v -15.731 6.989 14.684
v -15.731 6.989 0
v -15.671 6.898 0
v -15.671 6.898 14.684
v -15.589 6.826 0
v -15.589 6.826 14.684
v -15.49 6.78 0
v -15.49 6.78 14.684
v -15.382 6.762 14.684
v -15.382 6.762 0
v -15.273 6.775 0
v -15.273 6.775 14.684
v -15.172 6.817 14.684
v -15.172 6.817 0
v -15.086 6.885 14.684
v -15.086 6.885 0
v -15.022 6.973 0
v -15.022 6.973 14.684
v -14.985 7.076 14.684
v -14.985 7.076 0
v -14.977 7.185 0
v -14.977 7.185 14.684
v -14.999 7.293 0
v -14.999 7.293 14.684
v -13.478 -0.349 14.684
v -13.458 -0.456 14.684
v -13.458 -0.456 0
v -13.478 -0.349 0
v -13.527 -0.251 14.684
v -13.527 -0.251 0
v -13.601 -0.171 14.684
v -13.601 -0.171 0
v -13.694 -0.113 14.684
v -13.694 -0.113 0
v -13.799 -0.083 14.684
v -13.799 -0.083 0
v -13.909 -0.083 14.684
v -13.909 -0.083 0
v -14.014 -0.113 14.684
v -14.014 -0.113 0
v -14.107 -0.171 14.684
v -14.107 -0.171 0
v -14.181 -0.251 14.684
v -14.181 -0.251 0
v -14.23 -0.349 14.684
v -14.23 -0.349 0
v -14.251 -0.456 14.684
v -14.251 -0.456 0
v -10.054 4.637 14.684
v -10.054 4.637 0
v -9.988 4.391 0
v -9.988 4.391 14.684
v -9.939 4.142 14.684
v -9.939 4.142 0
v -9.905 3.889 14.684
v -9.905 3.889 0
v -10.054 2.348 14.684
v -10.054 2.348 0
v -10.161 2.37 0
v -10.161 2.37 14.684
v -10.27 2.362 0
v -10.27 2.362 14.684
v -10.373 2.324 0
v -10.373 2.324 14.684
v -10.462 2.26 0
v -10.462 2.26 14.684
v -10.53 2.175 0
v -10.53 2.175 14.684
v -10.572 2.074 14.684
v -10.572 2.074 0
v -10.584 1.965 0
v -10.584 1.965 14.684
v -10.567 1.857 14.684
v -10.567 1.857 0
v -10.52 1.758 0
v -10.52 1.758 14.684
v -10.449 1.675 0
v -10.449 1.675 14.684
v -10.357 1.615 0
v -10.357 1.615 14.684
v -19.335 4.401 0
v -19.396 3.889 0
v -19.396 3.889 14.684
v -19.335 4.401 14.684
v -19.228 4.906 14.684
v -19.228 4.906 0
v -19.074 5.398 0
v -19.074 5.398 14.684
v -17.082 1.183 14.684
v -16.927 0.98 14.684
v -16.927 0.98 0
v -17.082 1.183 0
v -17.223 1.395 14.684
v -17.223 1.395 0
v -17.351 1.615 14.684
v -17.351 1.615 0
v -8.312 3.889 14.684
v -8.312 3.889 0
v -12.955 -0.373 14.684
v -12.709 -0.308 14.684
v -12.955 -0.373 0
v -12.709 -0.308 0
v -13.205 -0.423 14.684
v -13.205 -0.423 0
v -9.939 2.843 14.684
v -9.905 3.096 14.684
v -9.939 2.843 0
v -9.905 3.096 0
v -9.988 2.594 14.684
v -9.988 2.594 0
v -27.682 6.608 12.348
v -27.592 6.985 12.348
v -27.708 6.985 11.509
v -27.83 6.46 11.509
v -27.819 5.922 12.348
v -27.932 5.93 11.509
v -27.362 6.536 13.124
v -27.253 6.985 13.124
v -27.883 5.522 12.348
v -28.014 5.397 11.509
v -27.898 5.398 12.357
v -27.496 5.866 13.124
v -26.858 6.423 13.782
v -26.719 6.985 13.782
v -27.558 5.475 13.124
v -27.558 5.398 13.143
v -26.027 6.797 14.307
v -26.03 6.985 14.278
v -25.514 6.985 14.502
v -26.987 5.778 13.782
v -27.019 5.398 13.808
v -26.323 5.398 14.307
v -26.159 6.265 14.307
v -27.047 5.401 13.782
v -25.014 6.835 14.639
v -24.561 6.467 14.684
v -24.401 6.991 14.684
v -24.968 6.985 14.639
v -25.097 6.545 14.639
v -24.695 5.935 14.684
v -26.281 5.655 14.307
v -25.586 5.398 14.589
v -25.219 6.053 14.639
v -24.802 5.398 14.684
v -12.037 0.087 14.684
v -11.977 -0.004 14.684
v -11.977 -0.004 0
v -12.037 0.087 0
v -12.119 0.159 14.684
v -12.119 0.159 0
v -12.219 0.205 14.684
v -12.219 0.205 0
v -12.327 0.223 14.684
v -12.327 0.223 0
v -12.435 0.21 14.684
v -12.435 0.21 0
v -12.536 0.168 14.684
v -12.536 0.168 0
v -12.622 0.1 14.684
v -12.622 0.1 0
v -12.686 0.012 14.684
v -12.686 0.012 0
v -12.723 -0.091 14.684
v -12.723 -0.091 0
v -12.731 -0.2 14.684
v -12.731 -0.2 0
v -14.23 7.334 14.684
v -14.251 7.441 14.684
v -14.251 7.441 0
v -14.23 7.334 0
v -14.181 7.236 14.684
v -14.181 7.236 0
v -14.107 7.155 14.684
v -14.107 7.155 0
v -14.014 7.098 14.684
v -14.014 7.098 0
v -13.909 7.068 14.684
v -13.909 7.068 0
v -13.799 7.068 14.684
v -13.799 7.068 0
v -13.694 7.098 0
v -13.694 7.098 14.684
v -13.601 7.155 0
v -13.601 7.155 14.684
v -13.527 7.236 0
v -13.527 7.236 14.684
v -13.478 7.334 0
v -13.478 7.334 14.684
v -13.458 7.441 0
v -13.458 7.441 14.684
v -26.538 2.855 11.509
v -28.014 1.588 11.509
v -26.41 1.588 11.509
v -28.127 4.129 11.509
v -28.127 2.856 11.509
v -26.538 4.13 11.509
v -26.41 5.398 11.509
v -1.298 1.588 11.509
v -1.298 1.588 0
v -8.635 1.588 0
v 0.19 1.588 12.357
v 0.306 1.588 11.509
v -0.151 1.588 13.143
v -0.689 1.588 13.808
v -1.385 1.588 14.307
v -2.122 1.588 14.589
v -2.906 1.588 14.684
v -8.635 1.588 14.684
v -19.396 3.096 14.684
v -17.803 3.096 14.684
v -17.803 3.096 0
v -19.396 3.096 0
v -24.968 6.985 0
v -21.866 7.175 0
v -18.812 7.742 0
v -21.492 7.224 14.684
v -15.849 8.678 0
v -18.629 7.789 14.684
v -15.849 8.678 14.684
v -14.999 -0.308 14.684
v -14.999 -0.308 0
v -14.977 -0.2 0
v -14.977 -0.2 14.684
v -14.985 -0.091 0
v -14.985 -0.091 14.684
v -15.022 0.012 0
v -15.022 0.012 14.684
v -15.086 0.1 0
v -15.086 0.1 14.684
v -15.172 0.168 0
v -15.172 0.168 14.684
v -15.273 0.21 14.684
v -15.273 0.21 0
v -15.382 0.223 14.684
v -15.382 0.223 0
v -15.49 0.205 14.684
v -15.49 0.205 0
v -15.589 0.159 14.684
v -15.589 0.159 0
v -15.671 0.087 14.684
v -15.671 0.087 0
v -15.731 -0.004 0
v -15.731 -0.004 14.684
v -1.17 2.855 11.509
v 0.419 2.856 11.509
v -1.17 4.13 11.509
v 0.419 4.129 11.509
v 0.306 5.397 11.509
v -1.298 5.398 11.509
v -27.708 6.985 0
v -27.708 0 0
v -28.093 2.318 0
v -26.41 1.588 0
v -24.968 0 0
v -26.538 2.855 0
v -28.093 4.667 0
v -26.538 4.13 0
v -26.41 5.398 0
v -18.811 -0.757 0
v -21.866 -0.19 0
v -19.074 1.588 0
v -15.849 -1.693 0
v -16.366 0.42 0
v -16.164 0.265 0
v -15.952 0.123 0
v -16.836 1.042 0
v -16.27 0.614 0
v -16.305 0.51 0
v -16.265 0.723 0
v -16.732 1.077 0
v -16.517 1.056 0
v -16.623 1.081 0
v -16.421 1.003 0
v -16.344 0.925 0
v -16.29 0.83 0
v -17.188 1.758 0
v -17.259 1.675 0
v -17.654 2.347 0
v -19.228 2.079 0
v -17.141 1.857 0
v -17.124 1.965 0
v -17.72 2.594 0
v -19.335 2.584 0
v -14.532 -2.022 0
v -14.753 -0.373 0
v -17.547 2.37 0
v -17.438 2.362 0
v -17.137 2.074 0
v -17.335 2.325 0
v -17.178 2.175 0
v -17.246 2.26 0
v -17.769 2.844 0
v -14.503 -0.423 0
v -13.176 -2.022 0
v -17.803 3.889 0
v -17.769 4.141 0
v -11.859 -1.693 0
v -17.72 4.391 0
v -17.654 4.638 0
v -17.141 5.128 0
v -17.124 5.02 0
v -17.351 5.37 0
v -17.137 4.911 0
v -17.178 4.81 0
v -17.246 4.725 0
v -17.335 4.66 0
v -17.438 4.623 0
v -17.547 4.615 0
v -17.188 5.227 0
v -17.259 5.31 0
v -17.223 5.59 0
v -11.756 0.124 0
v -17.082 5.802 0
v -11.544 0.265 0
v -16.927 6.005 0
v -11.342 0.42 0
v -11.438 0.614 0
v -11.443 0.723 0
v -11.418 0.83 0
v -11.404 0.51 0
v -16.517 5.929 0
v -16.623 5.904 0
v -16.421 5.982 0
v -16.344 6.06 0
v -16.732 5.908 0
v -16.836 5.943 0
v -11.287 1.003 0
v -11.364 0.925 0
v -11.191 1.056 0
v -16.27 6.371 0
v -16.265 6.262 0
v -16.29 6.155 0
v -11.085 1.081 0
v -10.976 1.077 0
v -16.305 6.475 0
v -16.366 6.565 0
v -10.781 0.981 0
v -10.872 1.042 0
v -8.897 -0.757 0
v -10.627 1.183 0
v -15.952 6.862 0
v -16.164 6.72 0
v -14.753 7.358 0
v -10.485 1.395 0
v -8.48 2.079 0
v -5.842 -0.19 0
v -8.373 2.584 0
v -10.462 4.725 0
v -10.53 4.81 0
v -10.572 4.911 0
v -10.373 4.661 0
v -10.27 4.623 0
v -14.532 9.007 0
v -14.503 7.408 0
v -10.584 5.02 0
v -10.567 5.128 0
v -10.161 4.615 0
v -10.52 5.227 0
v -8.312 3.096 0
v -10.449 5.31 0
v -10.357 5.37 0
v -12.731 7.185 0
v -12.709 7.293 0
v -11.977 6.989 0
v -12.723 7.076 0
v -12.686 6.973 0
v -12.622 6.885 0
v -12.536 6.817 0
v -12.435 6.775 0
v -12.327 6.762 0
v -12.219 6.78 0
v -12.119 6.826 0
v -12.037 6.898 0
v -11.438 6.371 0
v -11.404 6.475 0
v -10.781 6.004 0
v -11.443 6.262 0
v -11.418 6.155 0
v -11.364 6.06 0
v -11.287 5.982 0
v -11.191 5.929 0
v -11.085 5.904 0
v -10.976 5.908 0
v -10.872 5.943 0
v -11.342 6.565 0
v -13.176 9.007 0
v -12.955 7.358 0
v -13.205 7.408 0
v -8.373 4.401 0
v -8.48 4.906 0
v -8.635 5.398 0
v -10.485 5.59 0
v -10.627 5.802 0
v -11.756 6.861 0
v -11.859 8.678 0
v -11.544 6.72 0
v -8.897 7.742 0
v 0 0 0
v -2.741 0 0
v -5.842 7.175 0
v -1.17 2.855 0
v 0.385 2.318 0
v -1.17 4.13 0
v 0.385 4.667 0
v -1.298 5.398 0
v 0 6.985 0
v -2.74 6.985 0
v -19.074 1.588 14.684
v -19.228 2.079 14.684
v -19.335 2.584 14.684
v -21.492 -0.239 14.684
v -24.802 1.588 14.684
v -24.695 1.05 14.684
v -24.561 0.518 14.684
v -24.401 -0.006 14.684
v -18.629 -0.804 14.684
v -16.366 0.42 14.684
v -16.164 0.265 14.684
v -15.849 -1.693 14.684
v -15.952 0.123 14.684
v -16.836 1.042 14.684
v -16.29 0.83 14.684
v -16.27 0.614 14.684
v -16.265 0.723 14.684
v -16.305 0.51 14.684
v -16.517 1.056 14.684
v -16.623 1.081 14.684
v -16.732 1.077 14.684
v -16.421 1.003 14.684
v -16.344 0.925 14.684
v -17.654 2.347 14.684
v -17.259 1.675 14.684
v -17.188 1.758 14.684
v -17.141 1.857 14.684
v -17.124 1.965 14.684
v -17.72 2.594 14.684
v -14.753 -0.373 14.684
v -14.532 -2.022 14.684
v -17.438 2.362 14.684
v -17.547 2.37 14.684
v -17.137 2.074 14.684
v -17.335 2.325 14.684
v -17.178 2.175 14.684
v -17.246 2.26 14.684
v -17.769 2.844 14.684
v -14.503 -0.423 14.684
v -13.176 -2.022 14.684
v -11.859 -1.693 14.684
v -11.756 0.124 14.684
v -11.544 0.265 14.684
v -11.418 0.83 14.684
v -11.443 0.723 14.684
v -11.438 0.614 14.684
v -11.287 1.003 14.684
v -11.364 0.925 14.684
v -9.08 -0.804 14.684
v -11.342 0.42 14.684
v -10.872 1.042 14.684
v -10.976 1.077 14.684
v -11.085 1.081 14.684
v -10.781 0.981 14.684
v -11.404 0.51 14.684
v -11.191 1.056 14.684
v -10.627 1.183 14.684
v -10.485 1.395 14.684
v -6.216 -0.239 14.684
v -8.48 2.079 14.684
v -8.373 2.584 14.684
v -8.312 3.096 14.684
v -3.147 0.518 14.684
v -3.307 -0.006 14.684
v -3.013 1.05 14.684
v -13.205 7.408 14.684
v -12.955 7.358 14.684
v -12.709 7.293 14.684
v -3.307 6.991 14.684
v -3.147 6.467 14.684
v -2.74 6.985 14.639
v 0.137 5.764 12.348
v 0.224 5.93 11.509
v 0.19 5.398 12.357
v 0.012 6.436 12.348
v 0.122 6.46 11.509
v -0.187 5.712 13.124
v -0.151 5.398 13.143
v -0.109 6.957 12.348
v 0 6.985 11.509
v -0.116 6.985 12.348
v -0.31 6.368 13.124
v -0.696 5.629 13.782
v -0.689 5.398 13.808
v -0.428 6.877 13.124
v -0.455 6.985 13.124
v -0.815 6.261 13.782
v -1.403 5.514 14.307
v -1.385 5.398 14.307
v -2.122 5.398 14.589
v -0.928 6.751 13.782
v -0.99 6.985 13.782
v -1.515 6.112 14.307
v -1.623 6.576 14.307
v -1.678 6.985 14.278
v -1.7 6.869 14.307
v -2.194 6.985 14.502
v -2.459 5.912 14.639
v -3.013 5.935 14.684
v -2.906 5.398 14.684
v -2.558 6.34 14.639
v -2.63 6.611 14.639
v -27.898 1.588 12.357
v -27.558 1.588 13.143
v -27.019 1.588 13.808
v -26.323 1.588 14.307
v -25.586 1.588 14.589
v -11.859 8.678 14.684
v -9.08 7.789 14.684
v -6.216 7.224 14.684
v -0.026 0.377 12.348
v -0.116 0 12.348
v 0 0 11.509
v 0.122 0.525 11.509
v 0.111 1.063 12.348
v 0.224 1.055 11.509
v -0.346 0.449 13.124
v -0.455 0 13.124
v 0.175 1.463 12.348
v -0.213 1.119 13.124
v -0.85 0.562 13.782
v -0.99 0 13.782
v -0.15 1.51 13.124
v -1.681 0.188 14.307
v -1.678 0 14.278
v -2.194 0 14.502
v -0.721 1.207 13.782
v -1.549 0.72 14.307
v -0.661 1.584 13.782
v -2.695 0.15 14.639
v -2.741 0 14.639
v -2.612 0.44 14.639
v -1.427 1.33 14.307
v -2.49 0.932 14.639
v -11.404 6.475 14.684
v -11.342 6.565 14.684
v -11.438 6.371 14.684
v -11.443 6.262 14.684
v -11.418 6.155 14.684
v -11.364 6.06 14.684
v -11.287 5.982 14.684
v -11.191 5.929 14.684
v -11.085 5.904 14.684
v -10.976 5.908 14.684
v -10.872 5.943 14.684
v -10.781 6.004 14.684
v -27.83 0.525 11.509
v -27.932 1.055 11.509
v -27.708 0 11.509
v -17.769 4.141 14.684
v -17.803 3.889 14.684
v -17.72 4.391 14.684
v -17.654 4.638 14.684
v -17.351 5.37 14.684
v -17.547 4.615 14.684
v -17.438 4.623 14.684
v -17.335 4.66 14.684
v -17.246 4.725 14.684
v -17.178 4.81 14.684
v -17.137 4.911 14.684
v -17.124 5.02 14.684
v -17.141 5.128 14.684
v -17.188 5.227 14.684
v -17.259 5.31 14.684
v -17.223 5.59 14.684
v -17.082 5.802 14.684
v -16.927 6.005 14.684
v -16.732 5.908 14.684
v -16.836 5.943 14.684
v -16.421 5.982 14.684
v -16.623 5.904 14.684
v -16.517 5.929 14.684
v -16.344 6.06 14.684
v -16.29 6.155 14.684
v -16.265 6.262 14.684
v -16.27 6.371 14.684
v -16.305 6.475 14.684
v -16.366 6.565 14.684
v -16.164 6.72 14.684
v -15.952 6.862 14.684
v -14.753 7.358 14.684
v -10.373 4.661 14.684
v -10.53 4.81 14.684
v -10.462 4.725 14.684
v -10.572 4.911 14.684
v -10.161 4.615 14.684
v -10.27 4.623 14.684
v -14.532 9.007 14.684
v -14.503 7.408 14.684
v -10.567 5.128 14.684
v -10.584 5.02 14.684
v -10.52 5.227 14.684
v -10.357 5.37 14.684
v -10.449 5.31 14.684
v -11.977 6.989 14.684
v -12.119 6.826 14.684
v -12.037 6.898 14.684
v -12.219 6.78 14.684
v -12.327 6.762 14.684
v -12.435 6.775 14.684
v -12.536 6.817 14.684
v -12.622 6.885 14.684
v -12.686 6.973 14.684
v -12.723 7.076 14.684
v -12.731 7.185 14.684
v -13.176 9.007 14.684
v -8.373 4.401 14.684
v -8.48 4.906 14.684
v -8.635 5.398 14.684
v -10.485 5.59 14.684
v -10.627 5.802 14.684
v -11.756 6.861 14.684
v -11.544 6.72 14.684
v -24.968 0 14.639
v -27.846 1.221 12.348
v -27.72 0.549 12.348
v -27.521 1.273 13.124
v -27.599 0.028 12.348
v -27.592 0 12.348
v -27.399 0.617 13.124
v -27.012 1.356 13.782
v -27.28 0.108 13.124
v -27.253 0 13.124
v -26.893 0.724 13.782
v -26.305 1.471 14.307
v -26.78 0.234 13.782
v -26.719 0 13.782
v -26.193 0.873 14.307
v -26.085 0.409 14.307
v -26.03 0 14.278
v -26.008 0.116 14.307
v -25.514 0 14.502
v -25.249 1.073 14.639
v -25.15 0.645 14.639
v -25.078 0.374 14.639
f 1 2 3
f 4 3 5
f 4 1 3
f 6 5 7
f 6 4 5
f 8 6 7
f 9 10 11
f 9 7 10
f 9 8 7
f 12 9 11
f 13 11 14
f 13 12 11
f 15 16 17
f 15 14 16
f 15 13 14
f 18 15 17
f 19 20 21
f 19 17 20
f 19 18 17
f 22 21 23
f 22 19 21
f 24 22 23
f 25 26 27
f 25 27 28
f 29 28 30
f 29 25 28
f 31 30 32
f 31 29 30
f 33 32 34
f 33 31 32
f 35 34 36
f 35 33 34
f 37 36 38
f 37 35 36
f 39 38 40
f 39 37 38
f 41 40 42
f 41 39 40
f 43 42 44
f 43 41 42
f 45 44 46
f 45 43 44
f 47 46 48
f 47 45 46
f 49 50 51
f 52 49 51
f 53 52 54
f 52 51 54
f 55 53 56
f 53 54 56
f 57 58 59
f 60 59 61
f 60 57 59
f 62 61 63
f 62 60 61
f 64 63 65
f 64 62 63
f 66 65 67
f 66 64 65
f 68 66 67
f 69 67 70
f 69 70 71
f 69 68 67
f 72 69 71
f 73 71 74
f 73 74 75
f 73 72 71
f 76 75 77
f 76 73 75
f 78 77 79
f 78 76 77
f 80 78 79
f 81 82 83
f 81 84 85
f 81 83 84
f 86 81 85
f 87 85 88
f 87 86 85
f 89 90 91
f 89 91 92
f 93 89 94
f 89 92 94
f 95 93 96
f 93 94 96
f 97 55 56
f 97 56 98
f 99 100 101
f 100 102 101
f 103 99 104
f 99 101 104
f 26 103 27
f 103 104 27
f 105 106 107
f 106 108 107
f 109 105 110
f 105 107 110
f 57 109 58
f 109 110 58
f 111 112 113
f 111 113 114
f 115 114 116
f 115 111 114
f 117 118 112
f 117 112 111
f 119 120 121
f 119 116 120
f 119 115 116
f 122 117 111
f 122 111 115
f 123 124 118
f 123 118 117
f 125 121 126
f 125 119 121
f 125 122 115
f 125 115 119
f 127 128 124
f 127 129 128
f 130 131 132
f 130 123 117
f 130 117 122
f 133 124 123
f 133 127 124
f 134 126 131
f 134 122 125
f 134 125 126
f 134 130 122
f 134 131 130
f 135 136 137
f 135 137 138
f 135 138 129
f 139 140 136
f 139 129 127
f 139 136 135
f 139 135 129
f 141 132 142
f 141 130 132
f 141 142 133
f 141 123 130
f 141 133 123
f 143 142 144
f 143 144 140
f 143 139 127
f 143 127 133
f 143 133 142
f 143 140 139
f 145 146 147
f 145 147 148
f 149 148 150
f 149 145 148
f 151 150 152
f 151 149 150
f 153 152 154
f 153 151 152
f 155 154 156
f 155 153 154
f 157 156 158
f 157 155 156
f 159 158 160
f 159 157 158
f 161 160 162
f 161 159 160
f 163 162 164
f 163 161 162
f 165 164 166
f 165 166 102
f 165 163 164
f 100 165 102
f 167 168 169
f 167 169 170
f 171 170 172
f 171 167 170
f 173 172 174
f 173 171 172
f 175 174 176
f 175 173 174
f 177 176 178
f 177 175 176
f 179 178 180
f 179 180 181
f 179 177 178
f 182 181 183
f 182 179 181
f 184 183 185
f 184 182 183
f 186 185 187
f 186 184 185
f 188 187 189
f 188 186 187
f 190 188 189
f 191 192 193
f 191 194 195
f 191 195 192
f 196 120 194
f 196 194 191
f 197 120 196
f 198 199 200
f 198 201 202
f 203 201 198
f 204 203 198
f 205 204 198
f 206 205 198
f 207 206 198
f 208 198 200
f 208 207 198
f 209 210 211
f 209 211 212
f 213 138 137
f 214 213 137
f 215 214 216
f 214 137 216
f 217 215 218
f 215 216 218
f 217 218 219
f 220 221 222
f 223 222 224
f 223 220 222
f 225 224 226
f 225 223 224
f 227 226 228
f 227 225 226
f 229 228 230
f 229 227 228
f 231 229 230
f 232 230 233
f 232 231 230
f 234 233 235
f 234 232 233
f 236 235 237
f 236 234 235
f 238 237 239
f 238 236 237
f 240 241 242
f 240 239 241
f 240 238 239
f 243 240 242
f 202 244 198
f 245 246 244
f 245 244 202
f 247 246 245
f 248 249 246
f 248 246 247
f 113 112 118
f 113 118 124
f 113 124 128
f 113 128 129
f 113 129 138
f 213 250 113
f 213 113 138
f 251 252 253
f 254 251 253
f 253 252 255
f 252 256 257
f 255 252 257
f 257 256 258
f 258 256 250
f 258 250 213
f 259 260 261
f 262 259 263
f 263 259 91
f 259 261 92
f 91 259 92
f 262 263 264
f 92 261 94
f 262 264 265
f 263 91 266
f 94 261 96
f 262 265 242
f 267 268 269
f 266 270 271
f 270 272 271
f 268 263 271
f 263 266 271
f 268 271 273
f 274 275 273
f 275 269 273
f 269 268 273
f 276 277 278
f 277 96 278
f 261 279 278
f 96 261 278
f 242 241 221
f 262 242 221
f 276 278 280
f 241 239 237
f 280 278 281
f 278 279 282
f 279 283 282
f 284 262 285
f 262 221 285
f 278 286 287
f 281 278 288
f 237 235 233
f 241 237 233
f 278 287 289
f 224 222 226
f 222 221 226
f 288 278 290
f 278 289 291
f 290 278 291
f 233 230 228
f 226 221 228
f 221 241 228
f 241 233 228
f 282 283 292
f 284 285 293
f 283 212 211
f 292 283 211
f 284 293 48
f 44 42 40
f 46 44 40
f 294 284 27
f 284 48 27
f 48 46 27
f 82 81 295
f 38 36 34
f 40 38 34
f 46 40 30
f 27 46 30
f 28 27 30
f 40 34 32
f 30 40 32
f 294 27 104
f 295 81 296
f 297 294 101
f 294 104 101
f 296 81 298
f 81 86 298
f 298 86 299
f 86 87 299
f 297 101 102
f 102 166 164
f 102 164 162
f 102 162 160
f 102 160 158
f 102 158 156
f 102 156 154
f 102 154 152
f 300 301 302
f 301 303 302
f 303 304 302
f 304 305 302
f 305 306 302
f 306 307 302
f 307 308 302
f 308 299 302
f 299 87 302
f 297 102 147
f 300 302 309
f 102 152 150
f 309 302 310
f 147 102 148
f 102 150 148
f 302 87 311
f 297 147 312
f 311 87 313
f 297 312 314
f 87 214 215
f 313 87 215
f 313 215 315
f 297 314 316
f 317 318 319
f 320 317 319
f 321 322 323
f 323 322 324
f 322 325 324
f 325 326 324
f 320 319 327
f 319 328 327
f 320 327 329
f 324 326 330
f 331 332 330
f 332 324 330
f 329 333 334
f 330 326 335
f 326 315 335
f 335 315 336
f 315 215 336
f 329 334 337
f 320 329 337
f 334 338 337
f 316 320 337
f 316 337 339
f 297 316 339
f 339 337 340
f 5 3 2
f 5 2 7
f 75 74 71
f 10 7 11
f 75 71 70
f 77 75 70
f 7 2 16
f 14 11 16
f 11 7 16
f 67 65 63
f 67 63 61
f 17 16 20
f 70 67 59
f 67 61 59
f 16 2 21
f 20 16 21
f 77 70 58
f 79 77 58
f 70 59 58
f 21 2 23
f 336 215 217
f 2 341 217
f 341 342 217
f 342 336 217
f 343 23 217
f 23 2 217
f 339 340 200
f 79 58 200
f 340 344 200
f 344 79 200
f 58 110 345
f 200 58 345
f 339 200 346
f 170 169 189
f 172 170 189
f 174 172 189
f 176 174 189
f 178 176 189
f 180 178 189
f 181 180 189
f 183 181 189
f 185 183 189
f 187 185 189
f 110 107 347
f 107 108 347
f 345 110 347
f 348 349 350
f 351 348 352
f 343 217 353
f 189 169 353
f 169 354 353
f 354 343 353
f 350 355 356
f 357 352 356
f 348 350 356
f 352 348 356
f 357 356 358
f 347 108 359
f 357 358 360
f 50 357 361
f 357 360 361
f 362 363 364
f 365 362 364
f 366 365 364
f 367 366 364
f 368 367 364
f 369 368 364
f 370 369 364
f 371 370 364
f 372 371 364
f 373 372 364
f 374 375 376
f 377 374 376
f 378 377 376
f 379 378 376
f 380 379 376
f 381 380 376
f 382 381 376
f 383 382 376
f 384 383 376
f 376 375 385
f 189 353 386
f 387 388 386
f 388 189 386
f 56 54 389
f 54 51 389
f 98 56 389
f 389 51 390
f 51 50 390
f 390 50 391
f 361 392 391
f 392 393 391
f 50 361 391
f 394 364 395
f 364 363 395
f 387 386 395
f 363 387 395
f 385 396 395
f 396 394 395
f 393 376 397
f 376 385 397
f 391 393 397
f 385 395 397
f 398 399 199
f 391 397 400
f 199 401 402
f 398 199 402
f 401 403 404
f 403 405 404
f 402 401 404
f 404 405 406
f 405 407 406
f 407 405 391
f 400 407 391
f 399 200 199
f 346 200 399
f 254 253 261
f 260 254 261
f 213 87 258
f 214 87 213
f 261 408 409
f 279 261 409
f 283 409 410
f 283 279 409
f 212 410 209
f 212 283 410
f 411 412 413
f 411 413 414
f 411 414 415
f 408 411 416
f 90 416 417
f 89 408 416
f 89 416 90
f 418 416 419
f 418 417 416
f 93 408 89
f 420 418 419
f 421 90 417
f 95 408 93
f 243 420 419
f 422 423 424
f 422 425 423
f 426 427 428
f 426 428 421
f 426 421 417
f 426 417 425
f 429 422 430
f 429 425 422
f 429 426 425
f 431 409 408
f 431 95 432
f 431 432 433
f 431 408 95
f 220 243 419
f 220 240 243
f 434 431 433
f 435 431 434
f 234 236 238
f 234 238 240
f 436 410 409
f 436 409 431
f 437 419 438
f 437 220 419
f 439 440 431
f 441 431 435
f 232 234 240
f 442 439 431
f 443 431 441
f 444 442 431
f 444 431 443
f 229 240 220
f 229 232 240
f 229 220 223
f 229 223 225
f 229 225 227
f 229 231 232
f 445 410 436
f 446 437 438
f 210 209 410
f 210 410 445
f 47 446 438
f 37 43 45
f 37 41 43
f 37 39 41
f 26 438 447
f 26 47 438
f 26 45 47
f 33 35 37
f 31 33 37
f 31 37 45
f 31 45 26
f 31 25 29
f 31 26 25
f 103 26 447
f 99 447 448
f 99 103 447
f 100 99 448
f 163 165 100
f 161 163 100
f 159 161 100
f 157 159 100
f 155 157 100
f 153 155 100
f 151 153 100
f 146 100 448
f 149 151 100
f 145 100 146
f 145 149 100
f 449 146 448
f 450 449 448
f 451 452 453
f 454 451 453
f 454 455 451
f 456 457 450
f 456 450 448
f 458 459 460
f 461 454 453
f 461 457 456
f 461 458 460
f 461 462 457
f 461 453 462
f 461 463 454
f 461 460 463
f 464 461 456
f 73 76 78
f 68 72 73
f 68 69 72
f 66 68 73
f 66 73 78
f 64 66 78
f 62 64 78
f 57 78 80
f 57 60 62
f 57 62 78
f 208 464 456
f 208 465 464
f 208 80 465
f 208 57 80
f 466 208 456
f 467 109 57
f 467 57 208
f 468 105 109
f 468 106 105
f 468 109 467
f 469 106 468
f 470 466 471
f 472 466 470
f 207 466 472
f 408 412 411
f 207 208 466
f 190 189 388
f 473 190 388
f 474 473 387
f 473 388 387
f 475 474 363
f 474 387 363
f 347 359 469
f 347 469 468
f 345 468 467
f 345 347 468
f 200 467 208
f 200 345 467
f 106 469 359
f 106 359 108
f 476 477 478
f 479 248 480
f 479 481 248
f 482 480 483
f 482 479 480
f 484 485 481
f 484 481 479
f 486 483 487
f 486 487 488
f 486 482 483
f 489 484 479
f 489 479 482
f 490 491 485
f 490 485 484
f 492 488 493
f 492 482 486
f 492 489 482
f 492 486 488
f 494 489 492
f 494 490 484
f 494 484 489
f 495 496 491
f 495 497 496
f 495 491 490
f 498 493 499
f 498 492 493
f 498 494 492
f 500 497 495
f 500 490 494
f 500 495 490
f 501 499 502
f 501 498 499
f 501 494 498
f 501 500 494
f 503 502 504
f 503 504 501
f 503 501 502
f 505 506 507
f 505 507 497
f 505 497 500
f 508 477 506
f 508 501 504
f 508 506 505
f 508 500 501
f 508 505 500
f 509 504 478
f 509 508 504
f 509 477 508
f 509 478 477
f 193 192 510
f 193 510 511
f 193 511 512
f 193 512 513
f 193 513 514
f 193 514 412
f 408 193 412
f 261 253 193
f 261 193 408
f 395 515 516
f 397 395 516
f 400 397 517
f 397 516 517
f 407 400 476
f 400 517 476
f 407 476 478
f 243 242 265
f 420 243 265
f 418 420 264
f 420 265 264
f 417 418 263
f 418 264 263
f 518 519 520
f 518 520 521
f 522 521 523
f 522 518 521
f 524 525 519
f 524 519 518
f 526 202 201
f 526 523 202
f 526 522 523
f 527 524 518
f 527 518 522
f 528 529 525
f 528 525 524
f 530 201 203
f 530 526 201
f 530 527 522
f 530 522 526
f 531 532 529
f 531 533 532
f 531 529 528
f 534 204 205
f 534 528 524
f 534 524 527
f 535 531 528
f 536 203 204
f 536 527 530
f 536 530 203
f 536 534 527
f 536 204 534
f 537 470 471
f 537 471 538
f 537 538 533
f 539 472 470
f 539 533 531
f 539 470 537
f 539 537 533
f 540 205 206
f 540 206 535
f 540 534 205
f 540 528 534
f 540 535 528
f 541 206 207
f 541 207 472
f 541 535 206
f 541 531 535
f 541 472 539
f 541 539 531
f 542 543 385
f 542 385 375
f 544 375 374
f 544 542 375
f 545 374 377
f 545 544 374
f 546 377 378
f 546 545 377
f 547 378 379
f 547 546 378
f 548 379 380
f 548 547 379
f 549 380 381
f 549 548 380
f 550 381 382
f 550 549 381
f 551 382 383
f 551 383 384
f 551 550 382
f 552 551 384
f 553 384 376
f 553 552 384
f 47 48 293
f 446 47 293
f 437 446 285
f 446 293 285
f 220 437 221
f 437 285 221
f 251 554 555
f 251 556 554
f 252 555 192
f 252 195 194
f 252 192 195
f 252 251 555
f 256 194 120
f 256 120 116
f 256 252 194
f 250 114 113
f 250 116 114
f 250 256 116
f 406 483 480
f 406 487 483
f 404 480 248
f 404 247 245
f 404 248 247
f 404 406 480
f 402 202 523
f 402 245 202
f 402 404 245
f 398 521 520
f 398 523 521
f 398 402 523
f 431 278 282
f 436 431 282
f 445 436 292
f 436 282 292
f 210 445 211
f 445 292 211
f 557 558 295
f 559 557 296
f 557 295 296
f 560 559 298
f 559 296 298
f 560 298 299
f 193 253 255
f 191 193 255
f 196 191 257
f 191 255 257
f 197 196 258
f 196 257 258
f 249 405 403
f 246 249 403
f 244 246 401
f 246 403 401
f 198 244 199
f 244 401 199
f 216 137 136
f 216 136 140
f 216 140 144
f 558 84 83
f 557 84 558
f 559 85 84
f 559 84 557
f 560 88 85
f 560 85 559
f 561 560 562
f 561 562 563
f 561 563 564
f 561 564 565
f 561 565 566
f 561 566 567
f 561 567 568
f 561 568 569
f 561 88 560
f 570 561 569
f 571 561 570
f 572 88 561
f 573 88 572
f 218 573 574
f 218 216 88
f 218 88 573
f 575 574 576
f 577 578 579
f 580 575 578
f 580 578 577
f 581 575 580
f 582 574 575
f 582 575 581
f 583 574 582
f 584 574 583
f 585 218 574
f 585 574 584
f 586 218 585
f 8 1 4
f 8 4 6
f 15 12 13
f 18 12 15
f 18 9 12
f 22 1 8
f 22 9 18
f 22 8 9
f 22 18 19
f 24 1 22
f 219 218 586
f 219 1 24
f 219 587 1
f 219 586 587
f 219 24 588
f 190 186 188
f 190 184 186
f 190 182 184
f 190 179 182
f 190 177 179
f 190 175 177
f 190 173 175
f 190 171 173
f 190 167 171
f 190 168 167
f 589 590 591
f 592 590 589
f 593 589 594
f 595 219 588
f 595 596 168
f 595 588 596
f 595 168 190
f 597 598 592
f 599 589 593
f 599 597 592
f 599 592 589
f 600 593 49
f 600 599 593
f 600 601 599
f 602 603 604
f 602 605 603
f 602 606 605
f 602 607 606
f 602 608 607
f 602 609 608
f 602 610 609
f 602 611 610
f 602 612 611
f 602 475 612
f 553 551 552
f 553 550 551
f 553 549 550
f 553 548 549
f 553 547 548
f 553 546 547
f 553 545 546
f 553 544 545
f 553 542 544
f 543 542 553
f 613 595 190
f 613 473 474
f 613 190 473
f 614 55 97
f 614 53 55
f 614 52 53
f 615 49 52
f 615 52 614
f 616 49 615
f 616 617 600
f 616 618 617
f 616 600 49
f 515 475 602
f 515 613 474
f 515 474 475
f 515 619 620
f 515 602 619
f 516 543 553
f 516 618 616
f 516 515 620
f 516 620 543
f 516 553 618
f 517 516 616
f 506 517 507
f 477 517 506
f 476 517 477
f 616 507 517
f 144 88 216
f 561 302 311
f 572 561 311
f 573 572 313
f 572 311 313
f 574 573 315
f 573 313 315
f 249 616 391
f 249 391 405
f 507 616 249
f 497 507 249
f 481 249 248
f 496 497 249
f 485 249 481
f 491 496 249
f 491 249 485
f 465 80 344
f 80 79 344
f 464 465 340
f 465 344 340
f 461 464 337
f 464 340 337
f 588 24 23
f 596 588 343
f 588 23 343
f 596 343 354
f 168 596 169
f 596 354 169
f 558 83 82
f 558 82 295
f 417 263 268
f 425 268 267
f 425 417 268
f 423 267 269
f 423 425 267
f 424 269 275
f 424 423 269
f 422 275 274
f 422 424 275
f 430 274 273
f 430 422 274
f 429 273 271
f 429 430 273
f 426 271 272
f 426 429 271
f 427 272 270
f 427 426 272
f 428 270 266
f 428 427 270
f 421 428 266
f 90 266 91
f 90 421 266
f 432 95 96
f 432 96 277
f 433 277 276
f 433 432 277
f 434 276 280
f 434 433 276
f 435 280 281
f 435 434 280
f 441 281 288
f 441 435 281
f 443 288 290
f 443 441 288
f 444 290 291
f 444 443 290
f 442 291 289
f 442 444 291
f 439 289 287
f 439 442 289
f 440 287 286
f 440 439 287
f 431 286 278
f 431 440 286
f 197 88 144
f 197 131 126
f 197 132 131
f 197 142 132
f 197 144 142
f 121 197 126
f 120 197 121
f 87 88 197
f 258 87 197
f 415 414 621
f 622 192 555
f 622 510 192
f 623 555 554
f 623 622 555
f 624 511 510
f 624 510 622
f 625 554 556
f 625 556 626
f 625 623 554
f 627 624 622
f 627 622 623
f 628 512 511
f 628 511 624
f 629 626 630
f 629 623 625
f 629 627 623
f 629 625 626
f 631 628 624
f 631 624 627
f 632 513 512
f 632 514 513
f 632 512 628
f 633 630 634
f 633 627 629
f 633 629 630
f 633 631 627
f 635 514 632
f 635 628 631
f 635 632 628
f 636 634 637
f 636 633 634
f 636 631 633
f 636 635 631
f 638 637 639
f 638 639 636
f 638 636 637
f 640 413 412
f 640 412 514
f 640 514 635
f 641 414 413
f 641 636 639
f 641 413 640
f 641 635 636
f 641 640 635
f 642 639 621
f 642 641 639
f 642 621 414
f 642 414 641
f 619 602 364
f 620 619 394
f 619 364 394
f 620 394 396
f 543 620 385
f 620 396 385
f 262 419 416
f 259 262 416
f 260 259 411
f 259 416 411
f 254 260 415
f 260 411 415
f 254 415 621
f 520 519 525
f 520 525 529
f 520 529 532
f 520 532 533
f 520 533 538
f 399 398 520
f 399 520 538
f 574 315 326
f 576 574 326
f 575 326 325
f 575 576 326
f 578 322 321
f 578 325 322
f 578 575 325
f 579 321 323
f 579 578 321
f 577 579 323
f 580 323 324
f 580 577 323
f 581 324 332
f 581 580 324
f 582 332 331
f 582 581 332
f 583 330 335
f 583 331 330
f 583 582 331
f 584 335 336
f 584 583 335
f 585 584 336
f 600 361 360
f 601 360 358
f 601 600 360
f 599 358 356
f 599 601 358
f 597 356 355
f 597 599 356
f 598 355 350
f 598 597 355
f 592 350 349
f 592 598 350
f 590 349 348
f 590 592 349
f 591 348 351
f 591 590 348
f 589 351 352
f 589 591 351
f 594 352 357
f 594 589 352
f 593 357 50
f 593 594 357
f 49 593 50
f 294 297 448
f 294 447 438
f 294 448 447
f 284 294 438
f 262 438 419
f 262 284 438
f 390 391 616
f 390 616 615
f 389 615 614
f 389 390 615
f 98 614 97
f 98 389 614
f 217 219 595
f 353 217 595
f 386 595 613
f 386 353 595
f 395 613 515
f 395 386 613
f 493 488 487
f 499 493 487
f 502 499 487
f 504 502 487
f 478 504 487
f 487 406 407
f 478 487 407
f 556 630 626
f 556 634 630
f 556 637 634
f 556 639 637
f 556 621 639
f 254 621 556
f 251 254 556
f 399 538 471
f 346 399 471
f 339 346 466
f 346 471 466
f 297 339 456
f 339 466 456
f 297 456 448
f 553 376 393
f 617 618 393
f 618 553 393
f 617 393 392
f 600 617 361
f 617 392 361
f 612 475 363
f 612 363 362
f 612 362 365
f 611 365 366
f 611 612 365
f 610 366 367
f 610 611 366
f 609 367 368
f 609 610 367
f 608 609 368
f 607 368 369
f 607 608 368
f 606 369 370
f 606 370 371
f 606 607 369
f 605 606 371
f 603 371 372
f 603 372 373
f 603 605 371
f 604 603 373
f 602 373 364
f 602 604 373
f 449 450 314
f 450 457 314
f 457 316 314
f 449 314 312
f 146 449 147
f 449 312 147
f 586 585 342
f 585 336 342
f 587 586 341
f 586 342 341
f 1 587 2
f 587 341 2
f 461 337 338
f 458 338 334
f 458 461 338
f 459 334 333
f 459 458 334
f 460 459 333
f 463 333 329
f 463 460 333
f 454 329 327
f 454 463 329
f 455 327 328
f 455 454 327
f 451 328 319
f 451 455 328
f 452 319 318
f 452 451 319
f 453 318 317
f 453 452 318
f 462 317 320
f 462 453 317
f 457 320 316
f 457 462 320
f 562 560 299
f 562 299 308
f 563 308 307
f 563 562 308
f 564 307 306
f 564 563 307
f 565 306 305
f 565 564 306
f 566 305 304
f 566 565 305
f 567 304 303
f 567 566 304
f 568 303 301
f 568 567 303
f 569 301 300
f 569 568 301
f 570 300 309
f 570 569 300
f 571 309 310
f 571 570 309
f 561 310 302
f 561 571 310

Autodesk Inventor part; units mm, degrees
ref_plane "YZ Plane" through (0, 0, 0) normal (1, 0, 0) x (0, 1, 0)
ref_plane "XZ Plane" through (0, 0, 0) normal (0, 1, 0) x (-1, 0, 0)
ref_plane "XY Plane" through (0, 0, 0) normal (0, 0, 1) x (1, 0, 0)
sketch "Sketch10" plane through (0, 0, 0) normal (0, 0, 1) x (1, 0, 0)
  line L0 (0, 6.985) -> (-9.5327, 6.985)
  line L1 (0, 0) -> (-9.5327, 0)
  line L2 (-18.1754, 0) -> (-27.7081, 0)
  line L3 (-27.7081, 6.985) -> (-18.1754, 6.985)
  arc A0 (-9.5327, 6.985) -> (-18.1754, 6.985) centre (-13.8541, 3.4925) ccw
  arc A1 (-18.1754, 0) -> (-9.5327, 0) centre (-13.8541, 3.4925) ccw
  circle A2 centre (-13.8541, 3.4925) radius 3.9688
  line L4 (-26.4104, 1.5875) -> (-19.0735, 1.5875)
  line L5 (-19.0735, 5.3975) -> (-26.4104, 5.3975)
  line L6 (-8.6346, 1.5875) -> (-1.2978, 1.5875)
  line L7 (-1.2978, 5.3975) -> (-8.6346, 5.3975)
  arc A3 (-19.0735, 5.3975) -> (-19.0735, 1.5875) centre (-13.8541, 3.4925) ccw
  arc A4 (-8.6346, 1.5875) -> (-8.6346, 5.3975) centre (-13.8541, 3.4925) ccw
  arc A5 (-26.4104, 5.3975) -> (-26.4104, 1.5875) centre (-13.8541, 3.4925) ccw
  arc A6 (-27.7081, 6.985) -> (-27.7081, 0) centre (-13.8541, 3.4925) ccw
  arc A7 (-1.2978, 1.5875) -> (-1.2978, 5.3975) centre (-13.8541, 3.4925) ccw
  arc A8 (0, 0) -> (0, 6.985) centre (-13.8541, 3.4925) ccw
  dimension "d59" = 7.9375
  dimension "d152" = 1.5875
  dimension "d153" = 1.5875
  dimension "d158" = 3.81
  dimension "d168" = 12.7
  dimension "d169" = 12.7
  dimension "d170" = 1.5875
  dimension "d172" = 1.5875
extrude "Extrusion33" add sketch "Sketch10" along normal blind 14.6844
sketch "Sketch28" plane through (0, 0, 14.6844) normal (0, 0, 1) x (1, 0, 0)
  circle A0 centre (-13.8541, 3.4925) radius 3.9687 projected
  arc A1 (-26.4104, 5.3975) -> (-26.4104, 1.5875) centre (-13.8541, 3.4925) ccw
  arc A2 (-28.014, 5.3975) -> (-28.014, 1.5875) centre (-13.8541, 3.4925) ccw
  arc A3 (-1.2978, 1.5875) -> (-1.2978, 5.3975) centre (-13.8541, 3.4925) ccw
  arc A4 (0.3059, 1.5875) -> (0.3059, 5.3975) centre (-13.8541, 3.4925) ccw
  line L0 (-28.014, 5.3975) -> (-26.4104, 5.3975)
  line L1 (-26.4104, 1.5875) -> (-28.014, 1.5875)
  line L2 (-1.2978, 5.3975) -> (0.3059, 5.3975)
  line L3 (0.3059, 1.5875) -> (-1.2978, 1.5875)
  line L4 (-26.4104, 5.3975) -> (-19.0735, 5.3975) projected
  line L5 (-19.0735, 1.5875) -> (-26.4104, 1.5875) projected
  arc A5 (-26.4104, 5.3975) -> (-26.4104, 1.5875) centre (-13.8541, 3.4925) ccw projected
  arc A6 (-27.7081, 6.985) -> (-27.7081, 0) centre (-13.8541, 3.4925) ccw projected
  arc A7 (-1.2978, 1.5875) -> (-1.2978, 5.3975) centre (-13.8541, 3.4925) ccw projected
  arc A8 (0, 0) -> (0, 6.985) centre (-13.8541, 3.4925) ccw projected
extrude "Extrusion35" cut sketch "Sketch28" against normal blind 3.175 contours A1 L1 A2 L0 | A3 L2 A4 L3
sketch "Sketch30" plane through (0, 0, 14.6844) normal (0, 0, 1) x (1, 0, 0)
  circle A0 centre (-13.8541, 3.4925) radius 3.9687 projected
  circle A1 centre (-13.8541, 7.4612) radius 0.3969
  circle A2 centre (-15.3728, 7.1591) radius 0.3969
  circle A3 centre (-16.6604, 6.2988) radius 0.3969
  circle A4 centre (-17.5207, 5.0113) radius 0.3969
  circle A5 centre (-17.8228, 3.4925) radius 0.3969
  circle A6 centre (-17.5207, 1.9737) radius 0.3969
  circle A7 centre (-16.6604, 0.6862) radius 0.3969
  circle A8 centre (-15.3728, -0.1741) radius 0.3969
  circle A9 centre (-13.8541, -0.4763) radius 0.3969
  circle A10 centre (-12.3353, -0.1741) radius 0.3969
  circle A11 centre (-11.0477, 0.6862) radius 0.3969
  circle A12 centre (-10.1874, 1.9737) radius 0.3969
  circle A13 centre (-9.8853, 3.4925) radius 0.3969
  circle A14 centre (-10.1874, 5.0113) radius 0.3969
  circle A15 centre (-11.0477, 6.2988) radius 0.3969
  circle A16 centre (-12.3353, 7.1591) radius 0.3969
  point P0 (0, 0)
  dimension "d179" = 0.7937
  dimension "d182" = 360
fillet "Fillet6" radius 25.4 4 edges at (-9.5327, 6.985, 7.3422) (-18.1754, 6.985, 7.3422) (-9.5327, 0, 7.3422) (-18.1754, 0, 7.3422)
fillet "Fillet7" radius 3.175 4 edges at (0.1754, 6.1956, 14.6844) (0.1754, 0.7894, 14.6844) (-27.8835, 6.1956, 14.6844) (-27.8835, 0.7894, 14.6844)
extrude "Extrusion41" add sketch "Sketch30" against normal up to surface (14.6844 mm away) contours A0 A13 | A0 A13 | A14 A0 | A0 A14 | A12 A0 | A0 A12 | A15 A0 | A0 A15 | A11 A0 | A0 A11 | A16 A0 | A0 A16 | A10 A0 | A0 A10 | A1 A0 | A0 A1 | A9 A0 | A0 A9 | A2 A0 | A0 A2 | A8 A0 | A0 A8 | A3 A0 | A0 A3 | A7 A0 | A0 A7 | A4 A0 | A0 A4 | A6 A0 | A0 A6 | A5 A0 | A0 A5
sketch "Sketch33" plane through (0, 0, 14.6844) normal (0, 0, 1) x (1, 0, 0)
  line L0 (-19.4103, 3.8894) -> (-8.2978, 3.8894)
  line L1 (-8.2978, 3.8894) -> (-8.2978, 3.0956)
  line L2 (-8.2978, 3.0956) -> (-19.4103, 3.0956)
  line L3 (-19.4103, 3.0956) -> (-19.4103, 3.8894)
  arc A0 (-17.803, 3.0961) -> (-17.803, 3.8889) centre (-17.8228, 3.4925) ccw projected
  arc A1 (-8.6346, 1.5875) -> (-8.6346, 5.3975) centre (-13.8541, 3.4925) ccw projected
  arc A2 (-19.0735, 5.3975) -> (-19.0735, 1.5875) centre (-13.8541, 3.4925) ccw projected
  point P0 (0, 0)
extrude "Extrusion42" cut sketch "Sketch33" against normal through all
properties part number "extender-bracket"
